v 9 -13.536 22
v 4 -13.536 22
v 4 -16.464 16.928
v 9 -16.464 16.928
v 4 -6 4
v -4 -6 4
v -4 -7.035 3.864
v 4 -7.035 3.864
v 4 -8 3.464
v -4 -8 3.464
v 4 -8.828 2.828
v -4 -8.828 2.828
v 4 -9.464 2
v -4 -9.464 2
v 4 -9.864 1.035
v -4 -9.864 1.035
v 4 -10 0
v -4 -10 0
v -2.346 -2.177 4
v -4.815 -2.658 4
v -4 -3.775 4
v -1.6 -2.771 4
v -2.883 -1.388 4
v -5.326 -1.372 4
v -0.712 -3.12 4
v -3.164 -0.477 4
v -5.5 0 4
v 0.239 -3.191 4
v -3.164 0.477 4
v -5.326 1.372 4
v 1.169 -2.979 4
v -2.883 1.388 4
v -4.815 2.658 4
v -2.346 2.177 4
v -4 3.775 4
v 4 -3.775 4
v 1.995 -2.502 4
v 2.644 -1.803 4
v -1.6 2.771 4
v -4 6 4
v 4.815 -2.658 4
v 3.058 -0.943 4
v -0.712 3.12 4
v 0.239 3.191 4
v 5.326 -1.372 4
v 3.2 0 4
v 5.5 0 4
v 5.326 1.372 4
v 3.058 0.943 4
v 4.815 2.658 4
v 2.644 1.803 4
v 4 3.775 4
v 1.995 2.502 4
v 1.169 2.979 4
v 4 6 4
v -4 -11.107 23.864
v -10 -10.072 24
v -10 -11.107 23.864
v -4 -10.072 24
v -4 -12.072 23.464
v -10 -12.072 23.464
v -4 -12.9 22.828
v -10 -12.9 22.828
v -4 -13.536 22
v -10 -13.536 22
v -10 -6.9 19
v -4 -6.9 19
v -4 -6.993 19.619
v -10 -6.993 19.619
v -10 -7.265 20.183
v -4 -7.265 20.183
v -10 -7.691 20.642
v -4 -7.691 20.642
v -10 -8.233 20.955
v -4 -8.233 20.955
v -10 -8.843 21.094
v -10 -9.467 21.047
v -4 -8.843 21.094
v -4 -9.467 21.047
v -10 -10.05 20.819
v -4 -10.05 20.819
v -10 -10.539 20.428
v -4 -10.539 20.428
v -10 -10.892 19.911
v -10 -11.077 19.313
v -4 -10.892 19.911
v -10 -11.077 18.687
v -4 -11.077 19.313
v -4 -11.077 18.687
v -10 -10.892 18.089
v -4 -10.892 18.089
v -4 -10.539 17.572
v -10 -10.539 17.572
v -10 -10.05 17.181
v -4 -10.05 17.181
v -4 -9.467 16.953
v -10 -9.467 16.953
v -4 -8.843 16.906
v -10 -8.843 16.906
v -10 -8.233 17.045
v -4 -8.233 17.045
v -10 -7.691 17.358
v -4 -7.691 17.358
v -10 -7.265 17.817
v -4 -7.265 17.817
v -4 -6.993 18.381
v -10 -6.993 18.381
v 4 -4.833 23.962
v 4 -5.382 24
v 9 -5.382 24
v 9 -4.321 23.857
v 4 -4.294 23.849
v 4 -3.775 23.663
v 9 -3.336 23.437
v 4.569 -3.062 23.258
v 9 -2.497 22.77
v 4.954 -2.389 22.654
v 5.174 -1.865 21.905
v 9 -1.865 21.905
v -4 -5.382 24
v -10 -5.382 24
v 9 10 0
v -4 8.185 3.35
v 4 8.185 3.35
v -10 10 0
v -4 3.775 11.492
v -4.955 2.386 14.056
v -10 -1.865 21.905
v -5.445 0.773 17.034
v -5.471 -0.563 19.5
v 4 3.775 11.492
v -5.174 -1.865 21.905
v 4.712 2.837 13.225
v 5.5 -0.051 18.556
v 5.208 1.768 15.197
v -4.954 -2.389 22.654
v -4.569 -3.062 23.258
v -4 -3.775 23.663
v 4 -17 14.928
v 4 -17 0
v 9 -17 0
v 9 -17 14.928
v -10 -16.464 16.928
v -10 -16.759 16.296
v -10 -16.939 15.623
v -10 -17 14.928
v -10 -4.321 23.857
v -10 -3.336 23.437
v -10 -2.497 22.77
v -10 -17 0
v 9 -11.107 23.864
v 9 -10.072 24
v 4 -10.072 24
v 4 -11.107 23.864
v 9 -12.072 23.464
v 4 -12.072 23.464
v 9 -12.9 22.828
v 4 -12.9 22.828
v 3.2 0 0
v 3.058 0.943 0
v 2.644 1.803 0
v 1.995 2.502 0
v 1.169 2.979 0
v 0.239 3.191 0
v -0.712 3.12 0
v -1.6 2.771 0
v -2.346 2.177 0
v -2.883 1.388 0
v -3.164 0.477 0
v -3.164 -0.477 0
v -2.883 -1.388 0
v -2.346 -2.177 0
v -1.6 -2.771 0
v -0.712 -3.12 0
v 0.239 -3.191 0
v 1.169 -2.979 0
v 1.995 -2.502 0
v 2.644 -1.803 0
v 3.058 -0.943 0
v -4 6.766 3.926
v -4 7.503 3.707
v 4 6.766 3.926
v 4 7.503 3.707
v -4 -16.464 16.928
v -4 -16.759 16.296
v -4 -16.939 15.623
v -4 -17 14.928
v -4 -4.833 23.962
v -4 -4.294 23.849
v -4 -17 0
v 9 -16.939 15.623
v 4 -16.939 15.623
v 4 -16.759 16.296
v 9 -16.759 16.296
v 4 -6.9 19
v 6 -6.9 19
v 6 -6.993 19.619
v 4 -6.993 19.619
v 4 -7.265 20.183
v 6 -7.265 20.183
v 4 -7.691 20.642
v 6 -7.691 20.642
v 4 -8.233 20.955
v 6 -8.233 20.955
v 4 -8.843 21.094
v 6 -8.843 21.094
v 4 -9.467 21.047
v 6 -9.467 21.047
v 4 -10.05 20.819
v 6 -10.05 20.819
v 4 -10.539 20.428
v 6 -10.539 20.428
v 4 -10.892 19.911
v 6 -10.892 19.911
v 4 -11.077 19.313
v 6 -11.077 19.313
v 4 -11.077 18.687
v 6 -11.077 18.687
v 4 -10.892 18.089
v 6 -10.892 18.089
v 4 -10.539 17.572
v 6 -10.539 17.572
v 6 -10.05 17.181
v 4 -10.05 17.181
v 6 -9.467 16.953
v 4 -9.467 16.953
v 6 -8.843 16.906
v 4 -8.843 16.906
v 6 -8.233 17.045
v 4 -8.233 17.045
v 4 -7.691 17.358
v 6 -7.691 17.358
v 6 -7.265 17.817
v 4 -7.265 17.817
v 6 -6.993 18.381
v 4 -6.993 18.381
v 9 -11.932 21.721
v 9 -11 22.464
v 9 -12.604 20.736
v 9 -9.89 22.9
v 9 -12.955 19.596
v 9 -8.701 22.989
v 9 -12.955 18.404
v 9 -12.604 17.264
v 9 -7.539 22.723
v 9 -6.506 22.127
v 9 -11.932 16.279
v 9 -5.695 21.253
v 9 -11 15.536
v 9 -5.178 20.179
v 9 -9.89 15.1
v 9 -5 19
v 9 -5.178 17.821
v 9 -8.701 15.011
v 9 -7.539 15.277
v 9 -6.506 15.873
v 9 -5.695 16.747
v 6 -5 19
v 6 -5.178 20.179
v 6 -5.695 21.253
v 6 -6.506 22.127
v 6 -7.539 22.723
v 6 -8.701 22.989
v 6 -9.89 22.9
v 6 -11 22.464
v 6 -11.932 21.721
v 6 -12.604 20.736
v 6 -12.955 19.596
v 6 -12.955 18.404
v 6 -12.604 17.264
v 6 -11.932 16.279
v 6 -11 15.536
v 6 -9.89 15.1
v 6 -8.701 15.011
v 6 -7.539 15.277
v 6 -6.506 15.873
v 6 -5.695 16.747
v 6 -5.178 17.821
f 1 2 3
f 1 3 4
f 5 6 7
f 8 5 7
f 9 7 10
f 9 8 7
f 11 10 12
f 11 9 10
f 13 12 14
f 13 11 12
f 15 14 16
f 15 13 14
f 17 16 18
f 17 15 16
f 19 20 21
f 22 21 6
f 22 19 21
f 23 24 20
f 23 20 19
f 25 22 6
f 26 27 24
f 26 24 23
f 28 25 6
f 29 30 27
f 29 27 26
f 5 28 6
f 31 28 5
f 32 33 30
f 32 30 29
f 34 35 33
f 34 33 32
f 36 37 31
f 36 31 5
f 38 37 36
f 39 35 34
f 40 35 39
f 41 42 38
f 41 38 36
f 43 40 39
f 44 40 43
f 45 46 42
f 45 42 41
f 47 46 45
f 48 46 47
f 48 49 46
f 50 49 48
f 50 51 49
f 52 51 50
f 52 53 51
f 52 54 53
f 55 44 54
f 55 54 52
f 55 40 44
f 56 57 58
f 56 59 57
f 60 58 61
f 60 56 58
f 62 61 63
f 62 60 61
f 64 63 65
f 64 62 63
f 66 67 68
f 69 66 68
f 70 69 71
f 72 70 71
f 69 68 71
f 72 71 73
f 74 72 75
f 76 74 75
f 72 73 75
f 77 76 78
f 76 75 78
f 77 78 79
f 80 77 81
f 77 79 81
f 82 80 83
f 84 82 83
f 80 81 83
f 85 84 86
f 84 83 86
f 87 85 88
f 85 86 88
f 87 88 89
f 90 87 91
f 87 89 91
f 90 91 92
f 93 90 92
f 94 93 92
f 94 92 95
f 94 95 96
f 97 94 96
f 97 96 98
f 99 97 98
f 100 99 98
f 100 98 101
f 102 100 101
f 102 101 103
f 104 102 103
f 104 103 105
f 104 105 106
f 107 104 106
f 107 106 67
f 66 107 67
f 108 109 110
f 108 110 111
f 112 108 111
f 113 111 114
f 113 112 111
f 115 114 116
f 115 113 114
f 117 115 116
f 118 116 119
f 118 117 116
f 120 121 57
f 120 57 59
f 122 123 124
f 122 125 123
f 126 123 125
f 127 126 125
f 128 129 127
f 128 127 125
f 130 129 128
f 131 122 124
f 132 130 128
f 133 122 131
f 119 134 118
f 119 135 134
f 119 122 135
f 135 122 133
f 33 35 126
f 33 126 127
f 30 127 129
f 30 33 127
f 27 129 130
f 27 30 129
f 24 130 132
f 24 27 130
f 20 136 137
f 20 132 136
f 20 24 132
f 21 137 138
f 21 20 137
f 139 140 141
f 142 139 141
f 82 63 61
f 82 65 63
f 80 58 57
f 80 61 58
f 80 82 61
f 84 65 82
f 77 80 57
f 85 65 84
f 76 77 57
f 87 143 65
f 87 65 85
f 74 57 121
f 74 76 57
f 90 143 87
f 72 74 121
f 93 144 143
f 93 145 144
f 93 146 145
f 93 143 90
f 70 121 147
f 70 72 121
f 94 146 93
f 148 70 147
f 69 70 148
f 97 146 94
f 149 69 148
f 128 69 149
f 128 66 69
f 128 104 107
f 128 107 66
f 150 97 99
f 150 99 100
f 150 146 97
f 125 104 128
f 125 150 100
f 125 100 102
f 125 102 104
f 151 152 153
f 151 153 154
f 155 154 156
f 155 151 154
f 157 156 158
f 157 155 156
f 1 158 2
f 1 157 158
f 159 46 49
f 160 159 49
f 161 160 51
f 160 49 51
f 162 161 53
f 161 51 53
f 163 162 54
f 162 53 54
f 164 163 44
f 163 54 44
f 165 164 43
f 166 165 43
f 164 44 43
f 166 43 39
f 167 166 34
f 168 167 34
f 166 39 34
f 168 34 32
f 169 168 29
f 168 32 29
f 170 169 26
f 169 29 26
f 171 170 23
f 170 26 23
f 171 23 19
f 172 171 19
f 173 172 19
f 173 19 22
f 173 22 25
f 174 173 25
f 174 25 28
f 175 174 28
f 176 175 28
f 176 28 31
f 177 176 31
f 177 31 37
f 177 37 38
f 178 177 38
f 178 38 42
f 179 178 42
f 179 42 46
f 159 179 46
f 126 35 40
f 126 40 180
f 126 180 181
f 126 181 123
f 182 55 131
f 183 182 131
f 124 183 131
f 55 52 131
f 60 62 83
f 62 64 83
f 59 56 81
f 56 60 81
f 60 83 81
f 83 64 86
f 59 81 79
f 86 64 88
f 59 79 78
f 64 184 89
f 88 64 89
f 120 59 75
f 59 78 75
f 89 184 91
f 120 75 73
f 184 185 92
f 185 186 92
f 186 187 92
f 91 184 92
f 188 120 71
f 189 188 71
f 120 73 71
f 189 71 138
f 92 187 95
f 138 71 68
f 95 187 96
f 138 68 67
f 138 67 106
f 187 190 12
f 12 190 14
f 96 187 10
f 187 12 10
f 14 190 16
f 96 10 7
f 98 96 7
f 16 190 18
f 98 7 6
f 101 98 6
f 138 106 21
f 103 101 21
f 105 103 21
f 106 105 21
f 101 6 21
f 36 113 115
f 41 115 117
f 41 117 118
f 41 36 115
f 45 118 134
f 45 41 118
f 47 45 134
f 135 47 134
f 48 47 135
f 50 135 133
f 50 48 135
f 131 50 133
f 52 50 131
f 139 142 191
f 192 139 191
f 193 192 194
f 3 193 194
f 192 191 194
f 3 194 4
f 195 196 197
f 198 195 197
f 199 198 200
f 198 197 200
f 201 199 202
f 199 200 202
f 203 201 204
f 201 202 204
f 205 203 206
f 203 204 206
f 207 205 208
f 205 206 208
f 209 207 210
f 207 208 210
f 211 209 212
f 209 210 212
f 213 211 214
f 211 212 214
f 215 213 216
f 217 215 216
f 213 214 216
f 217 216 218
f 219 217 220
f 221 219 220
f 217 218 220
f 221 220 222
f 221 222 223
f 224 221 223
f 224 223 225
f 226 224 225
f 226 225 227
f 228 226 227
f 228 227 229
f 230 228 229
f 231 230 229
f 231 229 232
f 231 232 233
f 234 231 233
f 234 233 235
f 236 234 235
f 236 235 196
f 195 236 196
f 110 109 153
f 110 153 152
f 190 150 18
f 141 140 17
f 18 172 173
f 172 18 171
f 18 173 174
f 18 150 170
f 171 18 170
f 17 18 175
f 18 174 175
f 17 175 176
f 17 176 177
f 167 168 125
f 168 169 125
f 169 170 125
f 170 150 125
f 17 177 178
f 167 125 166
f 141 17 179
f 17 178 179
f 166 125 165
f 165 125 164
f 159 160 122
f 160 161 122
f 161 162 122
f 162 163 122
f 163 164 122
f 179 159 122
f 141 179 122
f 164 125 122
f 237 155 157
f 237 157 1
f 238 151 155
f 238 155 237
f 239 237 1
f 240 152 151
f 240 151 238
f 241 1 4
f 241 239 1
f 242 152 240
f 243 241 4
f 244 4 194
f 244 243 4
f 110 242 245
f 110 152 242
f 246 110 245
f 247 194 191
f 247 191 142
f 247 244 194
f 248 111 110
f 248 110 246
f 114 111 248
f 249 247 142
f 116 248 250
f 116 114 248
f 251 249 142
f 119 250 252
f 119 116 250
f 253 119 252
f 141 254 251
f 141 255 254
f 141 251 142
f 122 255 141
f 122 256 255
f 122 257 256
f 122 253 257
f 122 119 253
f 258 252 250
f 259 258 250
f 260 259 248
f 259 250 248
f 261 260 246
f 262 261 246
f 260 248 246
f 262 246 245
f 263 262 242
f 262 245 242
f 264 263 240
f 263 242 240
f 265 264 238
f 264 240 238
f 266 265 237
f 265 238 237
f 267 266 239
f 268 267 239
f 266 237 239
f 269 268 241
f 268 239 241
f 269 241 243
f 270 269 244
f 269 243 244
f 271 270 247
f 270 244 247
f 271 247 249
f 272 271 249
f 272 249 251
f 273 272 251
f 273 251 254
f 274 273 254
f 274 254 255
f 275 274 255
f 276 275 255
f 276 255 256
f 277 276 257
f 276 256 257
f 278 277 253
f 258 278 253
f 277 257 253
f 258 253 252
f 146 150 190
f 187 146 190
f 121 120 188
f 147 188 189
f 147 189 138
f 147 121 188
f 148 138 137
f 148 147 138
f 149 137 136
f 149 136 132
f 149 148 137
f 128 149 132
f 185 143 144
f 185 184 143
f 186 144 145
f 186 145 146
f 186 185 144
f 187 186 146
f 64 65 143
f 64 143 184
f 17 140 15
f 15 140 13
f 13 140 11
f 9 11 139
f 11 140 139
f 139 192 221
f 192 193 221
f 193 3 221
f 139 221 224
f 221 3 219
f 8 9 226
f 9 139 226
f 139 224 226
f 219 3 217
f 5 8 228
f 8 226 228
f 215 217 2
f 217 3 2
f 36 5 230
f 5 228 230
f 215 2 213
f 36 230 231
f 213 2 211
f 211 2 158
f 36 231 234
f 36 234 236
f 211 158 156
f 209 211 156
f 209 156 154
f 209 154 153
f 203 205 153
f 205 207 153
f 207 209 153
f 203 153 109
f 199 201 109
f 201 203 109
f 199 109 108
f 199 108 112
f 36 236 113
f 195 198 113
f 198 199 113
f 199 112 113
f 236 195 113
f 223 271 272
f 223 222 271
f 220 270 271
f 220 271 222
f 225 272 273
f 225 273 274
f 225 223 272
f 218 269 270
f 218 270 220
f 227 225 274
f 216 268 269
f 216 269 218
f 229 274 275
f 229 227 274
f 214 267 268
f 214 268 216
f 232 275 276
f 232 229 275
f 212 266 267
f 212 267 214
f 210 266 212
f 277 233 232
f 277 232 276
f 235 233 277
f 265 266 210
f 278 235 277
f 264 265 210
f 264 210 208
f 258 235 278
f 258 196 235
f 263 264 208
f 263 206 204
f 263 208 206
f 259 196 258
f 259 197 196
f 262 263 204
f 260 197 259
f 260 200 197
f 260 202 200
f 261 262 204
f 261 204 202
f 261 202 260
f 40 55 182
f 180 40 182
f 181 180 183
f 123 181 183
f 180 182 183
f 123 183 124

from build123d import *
from OCP.BRepFilletAPI import BRepFilletAPI_MakeChamfer

# Parameters (mm, degrees)
ESQUISSE1_W             = 20
ESQUISSE1_H             = 34
BOSS_EXTRU_1_DEPTH      = 4
ESQUISSE2_W             = 8
ESQUISSE2_H             = 7
ENL_V_MAT_EXTRU_1_DEPTH = 21.124611797
CONG_1_R                = 4
ESQUISSE3_W             = 6
ESQUISSE3_H             = 34
BOSS_EXTRU_2_DEPTH      = 20
ESQUISSE4_R             = 2.1
ENL_V_MAT_EXTRU_2_DEPTH = 36.566838488
CHANFREIN1_SIZE         = 8
CHANFREIN1_SIZE2        = 4.618802154
CONG_2_R                = 4
ESQUISSE5_R             = 3.2
ENL_V_MAT_EXTRU_3_DEPTH = 29.08914381
ESQUISSE6_R             = 5.5
ENL_V_MAT_EXTRU_4_DEPTH = 29.08914381
ENL_V_MAT_EXTRU_5_DEPTH = 36.566838488
CONG_3_R                = 4
ESQUISSE9_W             = 30.59391243
ESQUISSE9_H             = 32.996523038
ENL_V_MAT_EXTRU_6_DEPTH = 1
ESQUISSE10_R            = 4
ENL_V_MAT_EXTRU_7_DEPTH = 3


with BuildPart() as part:
    # Esquisse1 → Boss.-Extru.1 (new body)
    with BuildSketch(Plane.XY):
        Rectangle(ESQUISSE1_W, ESQUISSE1_H)
    extrude(amount=BOSS_EXTRU_1_DEPTH)

    # Esquisse2 → Enlèv. mat.-Extru.1 (cut, through all)
    with BuildSketch(Plane.XY.offset(4)):
        with Locations((0, 13.5)):
            Rectangle(ESQUISSE2_W, ESQUISSE2_H)
        with Locations((0, -13.5)):
            Rectangle(ESQUISSE2_W, ESQUISSE2_H)
    extrude(amount=-ENL_V_MAT_EXTRU_1_DEPTH, mode=Mode.SUBTRACT)

    # Congé1
    cong_1_edges = [part.edges().sort_by_distance(p)[0] for p in [
        (0, -10, 4),
        (0, 10, 4),
    ]]
    fillet(cong_1_edges, radius=CONG_1_R - 0.0001)  # a hair under: the kernel refuses the full size

    # Esquisse3 → Boss.-Extru.2 (add)
    with BuildSketch(Plane.XY.offset(4)):
        with Locations((-7, 0)):
            Rectangle(ESQUISSE3_W, ESQUISSE3_H)
        with Locations((7, 0)):
            Rectangle(ESQUISSE3_W, ESQUISSE3_H)
    extrude(amount=BOSS_EXTRU_2_DEPTH)

    # Esquisse4 → Enlèv. mat.-Extru.2 (cut, through all)
    with BuildSketch(Plane(origin=(10, 0, 0), x_dir=(0, 0, -1), z_dir=(1, 0, 0))):
        with Locations(Location((-19, 9, 0), (0, 0, 90))):
            Circle(ESQUISSE4_R)
        with Locations(Location((-19, -9, 0), (0, 0, 90))):
            Circle(ESQUISSE4_R)
    extrude(amount=-ENL_V_MAT_EXTRU_2_DEPTH, mode=Mode.SUBTRACT)

    # Chanfrein1: one chamfer whose edges measure the first distance from different faces: ONE call of the kernel's chamfer builder (chamfer() names one face for all edges)
    chanfrein1_edges_1 = [part.edges().sort_by_distance(p)[0] for p in [
        (-7, -17, 24),
    ]]
    chanfrein1_side_1 = [part.faces().sort_by_distance(p)[0] for p in [
        (-7, -17, 12),
    ]]
    chanfrein1_edges_2 = [part.edges().sort_by_distance(p)[0] for p in [
        (-7, 17, 24),
    ]]
    chanfrein1_side_2 = [part.faces().sort_by_distance(p)[0] for p in [
        (-7, 17, 12),
    ]]
    chanfrein1_edges_3 = [part.edges().sort_by_distance(p)[0] for p in [
        (7, -17, 24),
    ]]
    chanfrein1_side_3 = [part.faces().sort_by_distance(p)[0] for p in [
        (7, -17, 12),
    ]]
    chanfrein1_edges_4 = [part.edges().sort_by_distance(p)[0] for p in [
        (7, 17, 24),
    ]]
    chanfrein1_side_4 = [part.faces().sort_by_distance(p)[0] for p in [
        (7, 17, 12),
    ]]
    chanfrein1 = BRepFilletAPI_MakeChamfer(part.part.solid().wrapped)
    for e in chanfrein1_edges_1:
        chanfrein1.Add(CHANFREIN1_SIZE, CHANFREIN1_SIZE2, e.wrapped, chanfrein1_side_1[0].wrapped)  # the first distance lies on this face
    for e in chanfrein1_edges_2:
        chanfrein1.Add(CHANFREIN1_SIZE, CHANFREIN1_SIZE2, e.wrapped, chanfrein1_side_2[0].wrapped)  # the first distance lies on this face
    for e in chanfrein1_edges_3:
        chanfrein1.Add(CHANFREIN1_SIZE, CHANFREIN1_SIZE2, e.wrapped, chanfrein1_side_3[0].wrapped)  # the first distance lies on this face
    for e in chanfrein1_edges_4:
        chanfrein1.Add(CHANFREIN1_SIZE, CHANFREIN1_SIZE2, e.wrapped, chanfrein1_side_4[0].wrapped)  # the first distance lies on this face
    add(Compound.cast(chanfrein1.Shape()), mode=Mode.REPLACE)

    # Congé2
    cong_2_edges = [part.edges().sort_by_distance(p)[0] for p in [
        (-7, 12.381197846, 24),
        (-7, -12.381197846, 24),
        (-7, -17, 16),
        (7, 12.381197846, 24),
        (7, -12.381197846, 24),
        (7, -17, 16),
        (-7, 17, 16),
        (7, 17, 16),
    ]]
    fillet(cong_2_edges, radius=CONG_2_R)

    # Esquisse5 → Enlèv. mat.-Extru.3 (cut, through all)
    with BuildSketch(Plane.XY.offset(4)):
        Circle(ESQUISSE5_R)
    extrude(amount=-ENL_V_MAT_EXTRU_3_DEPTH, mode=Mode.SUBTRACT)

    # Esquisse6 → Enlèv. mat.-Extru.4 (cut, through all)
    with BuildSketch(Plane.XY.offset(4)):
        Circle(ESQUISSE6_R)
    extrude(amount=ENL_V_MAT_EXTRU_4_DEPTH, mode=Mode.SUBTRACT)

    # Esquisse8 → Enlèv. mat.-Extru.5 (cut, through all)
    with BuildSketch(Plane(origin=(10, 0, 0), x_dir=(0, 0, -1), z_dir=(1, 0, 0))):
        Polygon((0, 17), (0, 10), (-24, -3), (-24, 17), align=None)
    extrude(amount=-ENL_V_MAT_EXTRU_5_DEPTH, mode=Mode.SUBTRACT)

    # Congé3
    cong_3_edges = [part.edges().sort_by_distance(p)[0] for p in [
        (7.304886114, -3, 24),
        (-7.304886114, -3, 24),
    ]]
    fillet(cong_3_edges, radius=CONG_3_R)

    # Esquisse9 → Enlèv. mat.-Extru.6 (cut)
    with BuildSketch(Plane(origin=(10, 0, 0), x_dir=(0, 0, -1), z_dir=(1, 0, 0))):
        with Locations((-11.472185, -1.799431883)):
            Rectangle(ESQUISSE9_W, ESQUISSE9_H)
    extrude(amount=-ENL_V_MAT_EXTRU_6_DEPTH, mode=Mode.SUBTRACT)

    # Esquisse10 → Enlèv. mat.-Extru.7 (cut)
    with BuildSketch(Plane(origin=(9, 0, 0), x_dir=(0, 0, -1), z_dir=(1, 0, 0))):
        with Locations(Location((-19, -9, 0), (0, 0, 90))):
            Circle(ESQUISSE10_R)
    extrude(amount=-ENL_V_MAT_EXTRU_7_DEPTH, mode=Mode.SUBTRACT)


solid = part.part
